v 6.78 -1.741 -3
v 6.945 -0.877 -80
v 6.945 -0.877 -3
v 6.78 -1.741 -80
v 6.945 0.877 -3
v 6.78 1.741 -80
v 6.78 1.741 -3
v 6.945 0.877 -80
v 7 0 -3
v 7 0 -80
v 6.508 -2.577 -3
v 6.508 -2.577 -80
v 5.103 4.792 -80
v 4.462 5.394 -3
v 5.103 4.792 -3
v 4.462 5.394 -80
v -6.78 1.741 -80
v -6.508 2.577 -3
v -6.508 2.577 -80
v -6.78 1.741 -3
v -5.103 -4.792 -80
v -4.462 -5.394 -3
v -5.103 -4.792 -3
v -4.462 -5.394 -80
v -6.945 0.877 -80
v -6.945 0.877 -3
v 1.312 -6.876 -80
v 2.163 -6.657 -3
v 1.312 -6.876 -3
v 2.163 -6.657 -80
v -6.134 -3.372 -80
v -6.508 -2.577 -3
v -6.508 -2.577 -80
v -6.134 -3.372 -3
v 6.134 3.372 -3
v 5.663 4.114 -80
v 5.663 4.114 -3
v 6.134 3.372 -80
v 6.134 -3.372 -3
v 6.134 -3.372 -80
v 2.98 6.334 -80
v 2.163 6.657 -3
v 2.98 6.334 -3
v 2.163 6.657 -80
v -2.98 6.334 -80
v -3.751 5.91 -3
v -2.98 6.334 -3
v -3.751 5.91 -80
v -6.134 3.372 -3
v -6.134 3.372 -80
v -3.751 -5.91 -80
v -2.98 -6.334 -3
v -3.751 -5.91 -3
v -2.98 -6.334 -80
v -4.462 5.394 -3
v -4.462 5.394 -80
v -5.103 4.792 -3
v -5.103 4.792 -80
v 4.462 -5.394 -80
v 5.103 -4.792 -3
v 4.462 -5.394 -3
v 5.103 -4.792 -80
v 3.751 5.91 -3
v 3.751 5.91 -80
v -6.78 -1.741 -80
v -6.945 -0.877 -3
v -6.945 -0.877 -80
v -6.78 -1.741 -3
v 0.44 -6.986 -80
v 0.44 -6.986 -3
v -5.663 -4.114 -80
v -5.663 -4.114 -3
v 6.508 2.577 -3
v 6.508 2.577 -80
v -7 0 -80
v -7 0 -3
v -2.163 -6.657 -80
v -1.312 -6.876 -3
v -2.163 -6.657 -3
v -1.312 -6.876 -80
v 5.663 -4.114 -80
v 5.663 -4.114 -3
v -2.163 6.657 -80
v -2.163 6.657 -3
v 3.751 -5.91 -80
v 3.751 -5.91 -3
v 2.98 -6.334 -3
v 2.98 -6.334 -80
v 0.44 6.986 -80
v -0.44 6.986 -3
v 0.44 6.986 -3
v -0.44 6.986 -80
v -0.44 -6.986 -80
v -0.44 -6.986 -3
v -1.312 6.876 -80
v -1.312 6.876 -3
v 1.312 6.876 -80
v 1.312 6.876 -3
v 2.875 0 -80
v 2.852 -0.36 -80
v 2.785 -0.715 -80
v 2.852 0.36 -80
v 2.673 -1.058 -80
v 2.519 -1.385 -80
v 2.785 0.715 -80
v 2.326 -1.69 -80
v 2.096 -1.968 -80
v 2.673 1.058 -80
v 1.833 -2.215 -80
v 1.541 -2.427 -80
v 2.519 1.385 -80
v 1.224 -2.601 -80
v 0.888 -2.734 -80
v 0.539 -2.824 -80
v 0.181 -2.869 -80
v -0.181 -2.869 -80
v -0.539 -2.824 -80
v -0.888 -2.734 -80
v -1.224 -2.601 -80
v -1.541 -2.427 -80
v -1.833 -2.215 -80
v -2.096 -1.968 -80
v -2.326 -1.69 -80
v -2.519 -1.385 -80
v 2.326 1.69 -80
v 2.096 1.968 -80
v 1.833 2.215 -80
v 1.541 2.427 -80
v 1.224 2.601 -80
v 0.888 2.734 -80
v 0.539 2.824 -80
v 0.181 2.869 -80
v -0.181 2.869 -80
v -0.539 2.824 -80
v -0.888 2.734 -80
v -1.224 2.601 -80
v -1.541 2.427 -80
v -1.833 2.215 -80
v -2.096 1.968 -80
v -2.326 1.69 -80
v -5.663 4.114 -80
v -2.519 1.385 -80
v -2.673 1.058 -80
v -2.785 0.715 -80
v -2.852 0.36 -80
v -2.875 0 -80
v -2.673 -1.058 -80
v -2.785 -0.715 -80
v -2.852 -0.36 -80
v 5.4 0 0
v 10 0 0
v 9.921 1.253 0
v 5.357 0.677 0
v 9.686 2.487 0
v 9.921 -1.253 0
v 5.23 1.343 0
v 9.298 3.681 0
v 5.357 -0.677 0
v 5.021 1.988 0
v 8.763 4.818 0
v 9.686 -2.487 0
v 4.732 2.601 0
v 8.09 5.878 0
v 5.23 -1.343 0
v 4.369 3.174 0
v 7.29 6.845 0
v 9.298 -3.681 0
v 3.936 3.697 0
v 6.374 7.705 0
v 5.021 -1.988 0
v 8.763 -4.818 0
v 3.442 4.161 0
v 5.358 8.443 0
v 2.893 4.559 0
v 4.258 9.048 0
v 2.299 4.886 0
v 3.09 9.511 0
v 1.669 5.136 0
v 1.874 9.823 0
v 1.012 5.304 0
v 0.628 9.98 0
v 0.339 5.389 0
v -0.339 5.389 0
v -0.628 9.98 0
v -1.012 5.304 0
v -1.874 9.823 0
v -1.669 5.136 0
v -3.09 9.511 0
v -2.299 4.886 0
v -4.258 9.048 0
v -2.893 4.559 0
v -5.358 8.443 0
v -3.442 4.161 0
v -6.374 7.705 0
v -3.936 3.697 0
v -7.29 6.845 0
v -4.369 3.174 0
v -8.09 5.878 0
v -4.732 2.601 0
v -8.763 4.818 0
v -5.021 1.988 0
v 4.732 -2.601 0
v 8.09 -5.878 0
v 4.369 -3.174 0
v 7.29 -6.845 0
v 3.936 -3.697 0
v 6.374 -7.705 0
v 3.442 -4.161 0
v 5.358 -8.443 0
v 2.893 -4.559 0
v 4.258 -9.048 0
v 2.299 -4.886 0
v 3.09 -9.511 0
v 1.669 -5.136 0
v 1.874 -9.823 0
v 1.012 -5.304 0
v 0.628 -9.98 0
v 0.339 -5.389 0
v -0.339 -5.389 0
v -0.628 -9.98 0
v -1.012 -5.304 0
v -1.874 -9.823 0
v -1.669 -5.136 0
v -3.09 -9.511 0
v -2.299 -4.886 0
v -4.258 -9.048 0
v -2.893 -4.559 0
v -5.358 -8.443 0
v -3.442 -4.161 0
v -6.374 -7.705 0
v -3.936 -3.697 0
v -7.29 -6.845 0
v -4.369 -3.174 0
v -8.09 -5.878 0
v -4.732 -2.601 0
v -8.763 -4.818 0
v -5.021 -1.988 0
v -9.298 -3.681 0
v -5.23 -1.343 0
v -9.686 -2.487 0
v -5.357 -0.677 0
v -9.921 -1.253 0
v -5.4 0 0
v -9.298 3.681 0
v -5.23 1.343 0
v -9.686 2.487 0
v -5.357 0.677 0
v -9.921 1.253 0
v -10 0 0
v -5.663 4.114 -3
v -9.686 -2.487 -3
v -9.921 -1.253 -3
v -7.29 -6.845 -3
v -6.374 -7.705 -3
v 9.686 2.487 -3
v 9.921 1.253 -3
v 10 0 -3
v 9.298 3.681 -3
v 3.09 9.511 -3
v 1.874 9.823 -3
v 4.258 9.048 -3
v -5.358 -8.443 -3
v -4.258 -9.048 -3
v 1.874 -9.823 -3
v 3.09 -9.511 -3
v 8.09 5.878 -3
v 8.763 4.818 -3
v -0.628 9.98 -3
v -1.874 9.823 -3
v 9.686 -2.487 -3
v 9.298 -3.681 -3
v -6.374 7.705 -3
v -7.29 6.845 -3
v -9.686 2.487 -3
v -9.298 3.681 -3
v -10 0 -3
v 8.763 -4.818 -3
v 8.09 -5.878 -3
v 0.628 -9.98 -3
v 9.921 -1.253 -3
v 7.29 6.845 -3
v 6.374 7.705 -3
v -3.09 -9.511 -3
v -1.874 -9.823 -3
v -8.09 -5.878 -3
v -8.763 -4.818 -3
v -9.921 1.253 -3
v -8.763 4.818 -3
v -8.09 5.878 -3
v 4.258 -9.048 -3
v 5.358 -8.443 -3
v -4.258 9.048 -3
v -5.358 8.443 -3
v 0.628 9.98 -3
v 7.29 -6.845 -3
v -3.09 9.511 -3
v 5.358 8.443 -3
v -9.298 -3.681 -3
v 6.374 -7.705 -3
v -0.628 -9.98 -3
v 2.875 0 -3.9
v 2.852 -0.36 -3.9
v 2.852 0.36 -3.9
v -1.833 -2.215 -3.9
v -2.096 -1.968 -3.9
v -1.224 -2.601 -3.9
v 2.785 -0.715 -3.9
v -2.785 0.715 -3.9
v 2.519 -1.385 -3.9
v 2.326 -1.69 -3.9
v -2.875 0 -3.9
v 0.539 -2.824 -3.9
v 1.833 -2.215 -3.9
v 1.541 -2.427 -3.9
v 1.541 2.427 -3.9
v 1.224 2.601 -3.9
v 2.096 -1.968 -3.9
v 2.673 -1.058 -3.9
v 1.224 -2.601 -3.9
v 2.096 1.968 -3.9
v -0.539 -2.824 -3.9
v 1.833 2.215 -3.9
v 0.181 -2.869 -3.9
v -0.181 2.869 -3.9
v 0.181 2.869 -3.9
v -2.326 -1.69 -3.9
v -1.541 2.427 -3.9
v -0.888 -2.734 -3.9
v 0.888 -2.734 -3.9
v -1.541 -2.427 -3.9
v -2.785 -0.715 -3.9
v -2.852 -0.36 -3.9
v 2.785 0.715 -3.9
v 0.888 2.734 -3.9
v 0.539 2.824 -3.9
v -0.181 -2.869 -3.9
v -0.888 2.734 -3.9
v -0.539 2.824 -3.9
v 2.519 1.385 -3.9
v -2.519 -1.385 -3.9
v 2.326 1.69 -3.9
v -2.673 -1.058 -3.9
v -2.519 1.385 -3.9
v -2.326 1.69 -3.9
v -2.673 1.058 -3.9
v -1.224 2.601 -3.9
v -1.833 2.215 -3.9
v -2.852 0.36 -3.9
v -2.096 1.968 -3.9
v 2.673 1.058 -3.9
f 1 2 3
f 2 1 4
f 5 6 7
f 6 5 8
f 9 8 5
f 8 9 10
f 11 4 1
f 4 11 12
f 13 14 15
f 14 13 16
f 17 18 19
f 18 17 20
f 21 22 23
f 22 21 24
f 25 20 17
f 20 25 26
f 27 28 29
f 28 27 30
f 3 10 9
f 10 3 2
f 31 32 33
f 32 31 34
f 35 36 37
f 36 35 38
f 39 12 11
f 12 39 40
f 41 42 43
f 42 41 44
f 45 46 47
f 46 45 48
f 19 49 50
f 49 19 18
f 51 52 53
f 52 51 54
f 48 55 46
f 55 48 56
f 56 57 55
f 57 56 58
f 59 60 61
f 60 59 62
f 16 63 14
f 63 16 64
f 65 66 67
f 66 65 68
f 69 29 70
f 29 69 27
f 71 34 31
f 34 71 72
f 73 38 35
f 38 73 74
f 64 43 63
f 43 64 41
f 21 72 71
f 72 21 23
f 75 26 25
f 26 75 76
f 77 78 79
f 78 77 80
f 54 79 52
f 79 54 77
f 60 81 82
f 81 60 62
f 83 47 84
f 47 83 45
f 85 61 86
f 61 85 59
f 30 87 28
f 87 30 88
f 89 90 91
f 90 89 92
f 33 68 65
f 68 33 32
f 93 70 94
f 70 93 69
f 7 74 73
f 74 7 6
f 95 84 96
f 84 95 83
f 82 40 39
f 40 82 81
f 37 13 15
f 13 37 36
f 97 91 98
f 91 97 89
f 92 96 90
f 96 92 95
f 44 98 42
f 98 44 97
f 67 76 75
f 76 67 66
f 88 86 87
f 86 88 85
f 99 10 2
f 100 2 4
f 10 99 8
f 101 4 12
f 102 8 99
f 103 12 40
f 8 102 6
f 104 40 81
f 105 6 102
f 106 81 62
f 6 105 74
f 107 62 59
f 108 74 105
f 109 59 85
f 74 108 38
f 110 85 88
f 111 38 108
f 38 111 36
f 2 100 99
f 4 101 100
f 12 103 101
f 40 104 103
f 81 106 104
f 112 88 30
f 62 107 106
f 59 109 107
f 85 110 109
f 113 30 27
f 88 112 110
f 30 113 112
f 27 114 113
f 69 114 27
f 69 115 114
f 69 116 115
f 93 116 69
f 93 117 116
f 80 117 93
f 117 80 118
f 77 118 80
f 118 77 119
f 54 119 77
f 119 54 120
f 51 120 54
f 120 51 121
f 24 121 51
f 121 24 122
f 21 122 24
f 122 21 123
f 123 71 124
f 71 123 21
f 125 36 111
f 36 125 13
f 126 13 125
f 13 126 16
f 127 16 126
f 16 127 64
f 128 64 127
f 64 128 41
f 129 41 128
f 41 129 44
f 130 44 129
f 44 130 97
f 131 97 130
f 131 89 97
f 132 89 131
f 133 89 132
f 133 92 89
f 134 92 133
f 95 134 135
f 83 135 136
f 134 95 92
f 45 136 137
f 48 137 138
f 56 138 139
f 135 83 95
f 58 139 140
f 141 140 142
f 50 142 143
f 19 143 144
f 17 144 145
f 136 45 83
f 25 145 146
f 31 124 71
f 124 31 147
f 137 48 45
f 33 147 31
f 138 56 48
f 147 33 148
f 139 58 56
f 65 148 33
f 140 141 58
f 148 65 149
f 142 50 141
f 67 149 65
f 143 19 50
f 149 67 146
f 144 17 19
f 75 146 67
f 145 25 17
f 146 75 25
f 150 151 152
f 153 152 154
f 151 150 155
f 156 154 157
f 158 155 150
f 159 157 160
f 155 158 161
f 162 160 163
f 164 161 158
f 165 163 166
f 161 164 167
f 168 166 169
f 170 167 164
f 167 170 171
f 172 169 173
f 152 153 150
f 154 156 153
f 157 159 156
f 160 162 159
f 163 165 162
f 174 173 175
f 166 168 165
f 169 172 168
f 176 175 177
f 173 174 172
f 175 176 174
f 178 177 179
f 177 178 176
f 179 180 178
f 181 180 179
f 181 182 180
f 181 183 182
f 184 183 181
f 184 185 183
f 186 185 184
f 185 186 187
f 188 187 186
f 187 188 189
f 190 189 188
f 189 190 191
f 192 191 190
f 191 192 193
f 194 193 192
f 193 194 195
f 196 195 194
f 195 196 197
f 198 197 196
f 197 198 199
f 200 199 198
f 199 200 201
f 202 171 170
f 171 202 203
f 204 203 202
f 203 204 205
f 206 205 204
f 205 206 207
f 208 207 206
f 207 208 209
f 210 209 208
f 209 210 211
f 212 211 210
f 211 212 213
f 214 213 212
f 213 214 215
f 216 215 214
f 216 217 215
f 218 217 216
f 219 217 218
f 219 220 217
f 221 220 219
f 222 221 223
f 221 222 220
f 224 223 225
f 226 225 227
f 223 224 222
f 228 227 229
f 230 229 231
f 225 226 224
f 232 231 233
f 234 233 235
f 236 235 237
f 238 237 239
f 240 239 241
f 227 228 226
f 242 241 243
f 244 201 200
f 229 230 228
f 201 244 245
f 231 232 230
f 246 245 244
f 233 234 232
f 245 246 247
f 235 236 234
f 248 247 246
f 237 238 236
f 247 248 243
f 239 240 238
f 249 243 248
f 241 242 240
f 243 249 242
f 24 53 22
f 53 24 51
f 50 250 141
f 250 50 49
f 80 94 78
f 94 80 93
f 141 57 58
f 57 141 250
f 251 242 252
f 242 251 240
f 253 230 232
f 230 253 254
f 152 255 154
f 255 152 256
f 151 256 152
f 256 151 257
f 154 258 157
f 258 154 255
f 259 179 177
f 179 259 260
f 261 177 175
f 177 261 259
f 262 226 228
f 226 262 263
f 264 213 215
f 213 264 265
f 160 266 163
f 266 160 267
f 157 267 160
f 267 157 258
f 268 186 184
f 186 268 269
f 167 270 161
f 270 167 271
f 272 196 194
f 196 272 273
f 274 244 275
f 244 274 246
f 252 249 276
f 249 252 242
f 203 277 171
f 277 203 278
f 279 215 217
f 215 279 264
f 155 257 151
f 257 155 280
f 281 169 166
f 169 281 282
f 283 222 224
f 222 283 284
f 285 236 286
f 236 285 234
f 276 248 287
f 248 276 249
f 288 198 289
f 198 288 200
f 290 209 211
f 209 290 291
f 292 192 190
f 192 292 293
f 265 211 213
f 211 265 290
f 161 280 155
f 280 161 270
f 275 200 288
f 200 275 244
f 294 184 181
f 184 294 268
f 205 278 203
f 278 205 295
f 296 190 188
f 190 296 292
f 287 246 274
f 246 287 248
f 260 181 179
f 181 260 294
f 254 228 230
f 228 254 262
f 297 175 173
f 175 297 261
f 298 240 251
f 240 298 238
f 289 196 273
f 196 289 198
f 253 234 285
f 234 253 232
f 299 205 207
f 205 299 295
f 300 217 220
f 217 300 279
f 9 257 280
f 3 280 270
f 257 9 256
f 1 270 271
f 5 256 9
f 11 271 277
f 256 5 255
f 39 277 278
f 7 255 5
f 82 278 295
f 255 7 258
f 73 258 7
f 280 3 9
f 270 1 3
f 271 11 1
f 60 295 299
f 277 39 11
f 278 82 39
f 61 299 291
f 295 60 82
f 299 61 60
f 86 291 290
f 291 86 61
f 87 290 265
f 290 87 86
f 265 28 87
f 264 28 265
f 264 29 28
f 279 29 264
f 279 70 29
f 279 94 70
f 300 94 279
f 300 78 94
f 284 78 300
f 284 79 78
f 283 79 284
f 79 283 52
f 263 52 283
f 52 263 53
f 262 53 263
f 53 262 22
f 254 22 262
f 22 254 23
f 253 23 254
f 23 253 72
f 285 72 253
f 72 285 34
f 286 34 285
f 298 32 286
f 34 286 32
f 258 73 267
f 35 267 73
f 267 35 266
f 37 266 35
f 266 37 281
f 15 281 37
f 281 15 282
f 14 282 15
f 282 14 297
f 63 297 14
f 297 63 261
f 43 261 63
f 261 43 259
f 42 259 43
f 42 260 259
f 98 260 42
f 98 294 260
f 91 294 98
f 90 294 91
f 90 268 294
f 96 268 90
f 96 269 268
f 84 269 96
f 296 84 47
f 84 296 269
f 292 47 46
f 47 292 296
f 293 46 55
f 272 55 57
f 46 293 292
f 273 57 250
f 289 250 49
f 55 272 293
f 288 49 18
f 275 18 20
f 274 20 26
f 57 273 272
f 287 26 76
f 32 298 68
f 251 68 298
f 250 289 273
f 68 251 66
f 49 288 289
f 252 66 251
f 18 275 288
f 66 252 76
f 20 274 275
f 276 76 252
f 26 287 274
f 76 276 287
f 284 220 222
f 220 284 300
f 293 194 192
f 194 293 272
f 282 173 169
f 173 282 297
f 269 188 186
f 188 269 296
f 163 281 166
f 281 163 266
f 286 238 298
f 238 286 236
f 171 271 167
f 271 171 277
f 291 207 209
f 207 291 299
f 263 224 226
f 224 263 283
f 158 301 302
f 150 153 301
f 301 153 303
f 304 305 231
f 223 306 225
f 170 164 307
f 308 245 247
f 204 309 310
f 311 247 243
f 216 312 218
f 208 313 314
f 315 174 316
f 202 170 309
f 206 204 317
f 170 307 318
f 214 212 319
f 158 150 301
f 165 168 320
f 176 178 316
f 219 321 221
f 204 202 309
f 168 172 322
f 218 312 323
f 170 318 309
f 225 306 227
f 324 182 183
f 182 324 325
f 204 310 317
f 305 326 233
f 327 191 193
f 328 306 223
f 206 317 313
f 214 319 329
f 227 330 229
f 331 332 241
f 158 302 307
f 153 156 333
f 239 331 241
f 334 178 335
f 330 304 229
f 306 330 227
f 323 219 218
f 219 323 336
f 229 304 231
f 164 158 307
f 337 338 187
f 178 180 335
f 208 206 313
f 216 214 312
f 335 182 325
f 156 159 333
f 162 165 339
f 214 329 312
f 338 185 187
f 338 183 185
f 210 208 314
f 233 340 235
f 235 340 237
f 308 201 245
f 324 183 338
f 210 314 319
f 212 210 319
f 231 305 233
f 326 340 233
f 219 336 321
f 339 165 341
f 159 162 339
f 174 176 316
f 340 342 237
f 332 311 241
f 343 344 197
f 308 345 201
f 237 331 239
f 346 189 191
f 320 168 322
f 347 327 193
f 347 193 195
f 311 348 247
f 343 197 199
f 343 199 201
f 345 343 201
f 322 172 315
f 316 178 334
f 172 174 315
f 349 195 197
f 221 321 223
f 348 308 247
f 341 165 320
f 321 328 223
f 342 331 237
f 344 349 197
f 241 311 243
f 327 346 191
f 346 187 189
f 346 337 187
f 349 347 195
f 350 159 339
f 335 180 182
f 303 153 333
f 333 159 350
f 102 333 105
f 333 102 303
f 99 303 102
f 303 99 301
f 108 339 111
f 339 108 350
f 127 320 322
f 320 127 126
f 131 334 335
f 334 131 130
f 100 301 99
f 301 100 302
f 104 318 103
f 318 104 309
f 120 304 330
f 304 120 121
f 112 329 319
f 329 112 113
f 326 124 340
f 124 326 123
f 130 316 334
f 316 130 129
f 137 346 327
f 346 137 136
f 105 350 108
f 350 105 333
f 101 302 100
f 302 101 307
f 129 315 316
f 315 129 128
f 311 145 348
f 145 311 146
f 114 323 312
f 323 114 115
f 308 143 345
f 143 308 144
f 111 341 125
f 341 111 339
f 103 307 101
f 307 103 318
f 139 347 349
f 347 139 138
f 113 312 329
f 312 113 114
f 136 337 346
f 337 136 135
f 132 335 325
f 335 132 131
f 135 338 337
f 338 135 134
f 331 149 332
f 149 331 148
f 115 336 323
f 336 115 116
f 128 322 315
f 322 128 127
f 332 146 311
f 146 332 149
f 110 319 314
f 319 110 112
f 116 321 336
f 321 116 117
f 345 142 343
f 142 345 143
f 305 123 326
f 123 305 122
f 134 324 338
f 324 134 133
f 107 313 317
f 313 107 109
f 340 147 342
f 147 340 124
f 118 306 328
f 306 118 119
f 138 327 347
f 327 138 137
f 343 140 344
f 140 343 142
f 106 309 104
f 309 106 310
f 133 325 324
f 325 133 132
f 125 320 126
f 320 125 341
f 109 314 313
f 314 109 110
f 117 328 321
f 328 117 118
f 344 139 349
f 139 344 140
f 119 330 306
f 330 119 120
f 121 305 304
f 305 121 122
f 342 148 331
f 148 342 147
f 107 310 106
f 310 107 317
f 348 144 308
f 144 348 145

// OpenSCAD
$fn = 50;


difference() {
	union() {
		translate(v = [0, 0, -80.0000000000]) {
			cylinder(h = 80, r = 7.0000000000);
		}
		translate(v = [0, 0, -3.0000000000]) {
			cylinder(h = 3, r = 10.0000000000);
		}
	}
	union() {
		translate(v = [0, 0, 0]) {
			rotate(a = [0, 0, 0]) {
				difference() {
					union() {
						#translate(v = [0, 0, -80.0000000000]) {
							cylinder(h = 80, r = 2.6000000000);
						}
						#translate(v = [0, 0, -3.9000000000]) {
							cylinder(h = 3.9000000000, r1 = 2.8750000000, r2 = 5.4000000000);
						}
						#translate(v = [0, 0, -80.0000000000]) {
							cylinder(h = 80, r = 2.8750000000);
						}
						#translate(v = [0, 0, -80.0000000000]) {
							cylinder(h = 80, r = 2.6000000000);
						}
					}
					union();
				}
			}
		}
	}
}
